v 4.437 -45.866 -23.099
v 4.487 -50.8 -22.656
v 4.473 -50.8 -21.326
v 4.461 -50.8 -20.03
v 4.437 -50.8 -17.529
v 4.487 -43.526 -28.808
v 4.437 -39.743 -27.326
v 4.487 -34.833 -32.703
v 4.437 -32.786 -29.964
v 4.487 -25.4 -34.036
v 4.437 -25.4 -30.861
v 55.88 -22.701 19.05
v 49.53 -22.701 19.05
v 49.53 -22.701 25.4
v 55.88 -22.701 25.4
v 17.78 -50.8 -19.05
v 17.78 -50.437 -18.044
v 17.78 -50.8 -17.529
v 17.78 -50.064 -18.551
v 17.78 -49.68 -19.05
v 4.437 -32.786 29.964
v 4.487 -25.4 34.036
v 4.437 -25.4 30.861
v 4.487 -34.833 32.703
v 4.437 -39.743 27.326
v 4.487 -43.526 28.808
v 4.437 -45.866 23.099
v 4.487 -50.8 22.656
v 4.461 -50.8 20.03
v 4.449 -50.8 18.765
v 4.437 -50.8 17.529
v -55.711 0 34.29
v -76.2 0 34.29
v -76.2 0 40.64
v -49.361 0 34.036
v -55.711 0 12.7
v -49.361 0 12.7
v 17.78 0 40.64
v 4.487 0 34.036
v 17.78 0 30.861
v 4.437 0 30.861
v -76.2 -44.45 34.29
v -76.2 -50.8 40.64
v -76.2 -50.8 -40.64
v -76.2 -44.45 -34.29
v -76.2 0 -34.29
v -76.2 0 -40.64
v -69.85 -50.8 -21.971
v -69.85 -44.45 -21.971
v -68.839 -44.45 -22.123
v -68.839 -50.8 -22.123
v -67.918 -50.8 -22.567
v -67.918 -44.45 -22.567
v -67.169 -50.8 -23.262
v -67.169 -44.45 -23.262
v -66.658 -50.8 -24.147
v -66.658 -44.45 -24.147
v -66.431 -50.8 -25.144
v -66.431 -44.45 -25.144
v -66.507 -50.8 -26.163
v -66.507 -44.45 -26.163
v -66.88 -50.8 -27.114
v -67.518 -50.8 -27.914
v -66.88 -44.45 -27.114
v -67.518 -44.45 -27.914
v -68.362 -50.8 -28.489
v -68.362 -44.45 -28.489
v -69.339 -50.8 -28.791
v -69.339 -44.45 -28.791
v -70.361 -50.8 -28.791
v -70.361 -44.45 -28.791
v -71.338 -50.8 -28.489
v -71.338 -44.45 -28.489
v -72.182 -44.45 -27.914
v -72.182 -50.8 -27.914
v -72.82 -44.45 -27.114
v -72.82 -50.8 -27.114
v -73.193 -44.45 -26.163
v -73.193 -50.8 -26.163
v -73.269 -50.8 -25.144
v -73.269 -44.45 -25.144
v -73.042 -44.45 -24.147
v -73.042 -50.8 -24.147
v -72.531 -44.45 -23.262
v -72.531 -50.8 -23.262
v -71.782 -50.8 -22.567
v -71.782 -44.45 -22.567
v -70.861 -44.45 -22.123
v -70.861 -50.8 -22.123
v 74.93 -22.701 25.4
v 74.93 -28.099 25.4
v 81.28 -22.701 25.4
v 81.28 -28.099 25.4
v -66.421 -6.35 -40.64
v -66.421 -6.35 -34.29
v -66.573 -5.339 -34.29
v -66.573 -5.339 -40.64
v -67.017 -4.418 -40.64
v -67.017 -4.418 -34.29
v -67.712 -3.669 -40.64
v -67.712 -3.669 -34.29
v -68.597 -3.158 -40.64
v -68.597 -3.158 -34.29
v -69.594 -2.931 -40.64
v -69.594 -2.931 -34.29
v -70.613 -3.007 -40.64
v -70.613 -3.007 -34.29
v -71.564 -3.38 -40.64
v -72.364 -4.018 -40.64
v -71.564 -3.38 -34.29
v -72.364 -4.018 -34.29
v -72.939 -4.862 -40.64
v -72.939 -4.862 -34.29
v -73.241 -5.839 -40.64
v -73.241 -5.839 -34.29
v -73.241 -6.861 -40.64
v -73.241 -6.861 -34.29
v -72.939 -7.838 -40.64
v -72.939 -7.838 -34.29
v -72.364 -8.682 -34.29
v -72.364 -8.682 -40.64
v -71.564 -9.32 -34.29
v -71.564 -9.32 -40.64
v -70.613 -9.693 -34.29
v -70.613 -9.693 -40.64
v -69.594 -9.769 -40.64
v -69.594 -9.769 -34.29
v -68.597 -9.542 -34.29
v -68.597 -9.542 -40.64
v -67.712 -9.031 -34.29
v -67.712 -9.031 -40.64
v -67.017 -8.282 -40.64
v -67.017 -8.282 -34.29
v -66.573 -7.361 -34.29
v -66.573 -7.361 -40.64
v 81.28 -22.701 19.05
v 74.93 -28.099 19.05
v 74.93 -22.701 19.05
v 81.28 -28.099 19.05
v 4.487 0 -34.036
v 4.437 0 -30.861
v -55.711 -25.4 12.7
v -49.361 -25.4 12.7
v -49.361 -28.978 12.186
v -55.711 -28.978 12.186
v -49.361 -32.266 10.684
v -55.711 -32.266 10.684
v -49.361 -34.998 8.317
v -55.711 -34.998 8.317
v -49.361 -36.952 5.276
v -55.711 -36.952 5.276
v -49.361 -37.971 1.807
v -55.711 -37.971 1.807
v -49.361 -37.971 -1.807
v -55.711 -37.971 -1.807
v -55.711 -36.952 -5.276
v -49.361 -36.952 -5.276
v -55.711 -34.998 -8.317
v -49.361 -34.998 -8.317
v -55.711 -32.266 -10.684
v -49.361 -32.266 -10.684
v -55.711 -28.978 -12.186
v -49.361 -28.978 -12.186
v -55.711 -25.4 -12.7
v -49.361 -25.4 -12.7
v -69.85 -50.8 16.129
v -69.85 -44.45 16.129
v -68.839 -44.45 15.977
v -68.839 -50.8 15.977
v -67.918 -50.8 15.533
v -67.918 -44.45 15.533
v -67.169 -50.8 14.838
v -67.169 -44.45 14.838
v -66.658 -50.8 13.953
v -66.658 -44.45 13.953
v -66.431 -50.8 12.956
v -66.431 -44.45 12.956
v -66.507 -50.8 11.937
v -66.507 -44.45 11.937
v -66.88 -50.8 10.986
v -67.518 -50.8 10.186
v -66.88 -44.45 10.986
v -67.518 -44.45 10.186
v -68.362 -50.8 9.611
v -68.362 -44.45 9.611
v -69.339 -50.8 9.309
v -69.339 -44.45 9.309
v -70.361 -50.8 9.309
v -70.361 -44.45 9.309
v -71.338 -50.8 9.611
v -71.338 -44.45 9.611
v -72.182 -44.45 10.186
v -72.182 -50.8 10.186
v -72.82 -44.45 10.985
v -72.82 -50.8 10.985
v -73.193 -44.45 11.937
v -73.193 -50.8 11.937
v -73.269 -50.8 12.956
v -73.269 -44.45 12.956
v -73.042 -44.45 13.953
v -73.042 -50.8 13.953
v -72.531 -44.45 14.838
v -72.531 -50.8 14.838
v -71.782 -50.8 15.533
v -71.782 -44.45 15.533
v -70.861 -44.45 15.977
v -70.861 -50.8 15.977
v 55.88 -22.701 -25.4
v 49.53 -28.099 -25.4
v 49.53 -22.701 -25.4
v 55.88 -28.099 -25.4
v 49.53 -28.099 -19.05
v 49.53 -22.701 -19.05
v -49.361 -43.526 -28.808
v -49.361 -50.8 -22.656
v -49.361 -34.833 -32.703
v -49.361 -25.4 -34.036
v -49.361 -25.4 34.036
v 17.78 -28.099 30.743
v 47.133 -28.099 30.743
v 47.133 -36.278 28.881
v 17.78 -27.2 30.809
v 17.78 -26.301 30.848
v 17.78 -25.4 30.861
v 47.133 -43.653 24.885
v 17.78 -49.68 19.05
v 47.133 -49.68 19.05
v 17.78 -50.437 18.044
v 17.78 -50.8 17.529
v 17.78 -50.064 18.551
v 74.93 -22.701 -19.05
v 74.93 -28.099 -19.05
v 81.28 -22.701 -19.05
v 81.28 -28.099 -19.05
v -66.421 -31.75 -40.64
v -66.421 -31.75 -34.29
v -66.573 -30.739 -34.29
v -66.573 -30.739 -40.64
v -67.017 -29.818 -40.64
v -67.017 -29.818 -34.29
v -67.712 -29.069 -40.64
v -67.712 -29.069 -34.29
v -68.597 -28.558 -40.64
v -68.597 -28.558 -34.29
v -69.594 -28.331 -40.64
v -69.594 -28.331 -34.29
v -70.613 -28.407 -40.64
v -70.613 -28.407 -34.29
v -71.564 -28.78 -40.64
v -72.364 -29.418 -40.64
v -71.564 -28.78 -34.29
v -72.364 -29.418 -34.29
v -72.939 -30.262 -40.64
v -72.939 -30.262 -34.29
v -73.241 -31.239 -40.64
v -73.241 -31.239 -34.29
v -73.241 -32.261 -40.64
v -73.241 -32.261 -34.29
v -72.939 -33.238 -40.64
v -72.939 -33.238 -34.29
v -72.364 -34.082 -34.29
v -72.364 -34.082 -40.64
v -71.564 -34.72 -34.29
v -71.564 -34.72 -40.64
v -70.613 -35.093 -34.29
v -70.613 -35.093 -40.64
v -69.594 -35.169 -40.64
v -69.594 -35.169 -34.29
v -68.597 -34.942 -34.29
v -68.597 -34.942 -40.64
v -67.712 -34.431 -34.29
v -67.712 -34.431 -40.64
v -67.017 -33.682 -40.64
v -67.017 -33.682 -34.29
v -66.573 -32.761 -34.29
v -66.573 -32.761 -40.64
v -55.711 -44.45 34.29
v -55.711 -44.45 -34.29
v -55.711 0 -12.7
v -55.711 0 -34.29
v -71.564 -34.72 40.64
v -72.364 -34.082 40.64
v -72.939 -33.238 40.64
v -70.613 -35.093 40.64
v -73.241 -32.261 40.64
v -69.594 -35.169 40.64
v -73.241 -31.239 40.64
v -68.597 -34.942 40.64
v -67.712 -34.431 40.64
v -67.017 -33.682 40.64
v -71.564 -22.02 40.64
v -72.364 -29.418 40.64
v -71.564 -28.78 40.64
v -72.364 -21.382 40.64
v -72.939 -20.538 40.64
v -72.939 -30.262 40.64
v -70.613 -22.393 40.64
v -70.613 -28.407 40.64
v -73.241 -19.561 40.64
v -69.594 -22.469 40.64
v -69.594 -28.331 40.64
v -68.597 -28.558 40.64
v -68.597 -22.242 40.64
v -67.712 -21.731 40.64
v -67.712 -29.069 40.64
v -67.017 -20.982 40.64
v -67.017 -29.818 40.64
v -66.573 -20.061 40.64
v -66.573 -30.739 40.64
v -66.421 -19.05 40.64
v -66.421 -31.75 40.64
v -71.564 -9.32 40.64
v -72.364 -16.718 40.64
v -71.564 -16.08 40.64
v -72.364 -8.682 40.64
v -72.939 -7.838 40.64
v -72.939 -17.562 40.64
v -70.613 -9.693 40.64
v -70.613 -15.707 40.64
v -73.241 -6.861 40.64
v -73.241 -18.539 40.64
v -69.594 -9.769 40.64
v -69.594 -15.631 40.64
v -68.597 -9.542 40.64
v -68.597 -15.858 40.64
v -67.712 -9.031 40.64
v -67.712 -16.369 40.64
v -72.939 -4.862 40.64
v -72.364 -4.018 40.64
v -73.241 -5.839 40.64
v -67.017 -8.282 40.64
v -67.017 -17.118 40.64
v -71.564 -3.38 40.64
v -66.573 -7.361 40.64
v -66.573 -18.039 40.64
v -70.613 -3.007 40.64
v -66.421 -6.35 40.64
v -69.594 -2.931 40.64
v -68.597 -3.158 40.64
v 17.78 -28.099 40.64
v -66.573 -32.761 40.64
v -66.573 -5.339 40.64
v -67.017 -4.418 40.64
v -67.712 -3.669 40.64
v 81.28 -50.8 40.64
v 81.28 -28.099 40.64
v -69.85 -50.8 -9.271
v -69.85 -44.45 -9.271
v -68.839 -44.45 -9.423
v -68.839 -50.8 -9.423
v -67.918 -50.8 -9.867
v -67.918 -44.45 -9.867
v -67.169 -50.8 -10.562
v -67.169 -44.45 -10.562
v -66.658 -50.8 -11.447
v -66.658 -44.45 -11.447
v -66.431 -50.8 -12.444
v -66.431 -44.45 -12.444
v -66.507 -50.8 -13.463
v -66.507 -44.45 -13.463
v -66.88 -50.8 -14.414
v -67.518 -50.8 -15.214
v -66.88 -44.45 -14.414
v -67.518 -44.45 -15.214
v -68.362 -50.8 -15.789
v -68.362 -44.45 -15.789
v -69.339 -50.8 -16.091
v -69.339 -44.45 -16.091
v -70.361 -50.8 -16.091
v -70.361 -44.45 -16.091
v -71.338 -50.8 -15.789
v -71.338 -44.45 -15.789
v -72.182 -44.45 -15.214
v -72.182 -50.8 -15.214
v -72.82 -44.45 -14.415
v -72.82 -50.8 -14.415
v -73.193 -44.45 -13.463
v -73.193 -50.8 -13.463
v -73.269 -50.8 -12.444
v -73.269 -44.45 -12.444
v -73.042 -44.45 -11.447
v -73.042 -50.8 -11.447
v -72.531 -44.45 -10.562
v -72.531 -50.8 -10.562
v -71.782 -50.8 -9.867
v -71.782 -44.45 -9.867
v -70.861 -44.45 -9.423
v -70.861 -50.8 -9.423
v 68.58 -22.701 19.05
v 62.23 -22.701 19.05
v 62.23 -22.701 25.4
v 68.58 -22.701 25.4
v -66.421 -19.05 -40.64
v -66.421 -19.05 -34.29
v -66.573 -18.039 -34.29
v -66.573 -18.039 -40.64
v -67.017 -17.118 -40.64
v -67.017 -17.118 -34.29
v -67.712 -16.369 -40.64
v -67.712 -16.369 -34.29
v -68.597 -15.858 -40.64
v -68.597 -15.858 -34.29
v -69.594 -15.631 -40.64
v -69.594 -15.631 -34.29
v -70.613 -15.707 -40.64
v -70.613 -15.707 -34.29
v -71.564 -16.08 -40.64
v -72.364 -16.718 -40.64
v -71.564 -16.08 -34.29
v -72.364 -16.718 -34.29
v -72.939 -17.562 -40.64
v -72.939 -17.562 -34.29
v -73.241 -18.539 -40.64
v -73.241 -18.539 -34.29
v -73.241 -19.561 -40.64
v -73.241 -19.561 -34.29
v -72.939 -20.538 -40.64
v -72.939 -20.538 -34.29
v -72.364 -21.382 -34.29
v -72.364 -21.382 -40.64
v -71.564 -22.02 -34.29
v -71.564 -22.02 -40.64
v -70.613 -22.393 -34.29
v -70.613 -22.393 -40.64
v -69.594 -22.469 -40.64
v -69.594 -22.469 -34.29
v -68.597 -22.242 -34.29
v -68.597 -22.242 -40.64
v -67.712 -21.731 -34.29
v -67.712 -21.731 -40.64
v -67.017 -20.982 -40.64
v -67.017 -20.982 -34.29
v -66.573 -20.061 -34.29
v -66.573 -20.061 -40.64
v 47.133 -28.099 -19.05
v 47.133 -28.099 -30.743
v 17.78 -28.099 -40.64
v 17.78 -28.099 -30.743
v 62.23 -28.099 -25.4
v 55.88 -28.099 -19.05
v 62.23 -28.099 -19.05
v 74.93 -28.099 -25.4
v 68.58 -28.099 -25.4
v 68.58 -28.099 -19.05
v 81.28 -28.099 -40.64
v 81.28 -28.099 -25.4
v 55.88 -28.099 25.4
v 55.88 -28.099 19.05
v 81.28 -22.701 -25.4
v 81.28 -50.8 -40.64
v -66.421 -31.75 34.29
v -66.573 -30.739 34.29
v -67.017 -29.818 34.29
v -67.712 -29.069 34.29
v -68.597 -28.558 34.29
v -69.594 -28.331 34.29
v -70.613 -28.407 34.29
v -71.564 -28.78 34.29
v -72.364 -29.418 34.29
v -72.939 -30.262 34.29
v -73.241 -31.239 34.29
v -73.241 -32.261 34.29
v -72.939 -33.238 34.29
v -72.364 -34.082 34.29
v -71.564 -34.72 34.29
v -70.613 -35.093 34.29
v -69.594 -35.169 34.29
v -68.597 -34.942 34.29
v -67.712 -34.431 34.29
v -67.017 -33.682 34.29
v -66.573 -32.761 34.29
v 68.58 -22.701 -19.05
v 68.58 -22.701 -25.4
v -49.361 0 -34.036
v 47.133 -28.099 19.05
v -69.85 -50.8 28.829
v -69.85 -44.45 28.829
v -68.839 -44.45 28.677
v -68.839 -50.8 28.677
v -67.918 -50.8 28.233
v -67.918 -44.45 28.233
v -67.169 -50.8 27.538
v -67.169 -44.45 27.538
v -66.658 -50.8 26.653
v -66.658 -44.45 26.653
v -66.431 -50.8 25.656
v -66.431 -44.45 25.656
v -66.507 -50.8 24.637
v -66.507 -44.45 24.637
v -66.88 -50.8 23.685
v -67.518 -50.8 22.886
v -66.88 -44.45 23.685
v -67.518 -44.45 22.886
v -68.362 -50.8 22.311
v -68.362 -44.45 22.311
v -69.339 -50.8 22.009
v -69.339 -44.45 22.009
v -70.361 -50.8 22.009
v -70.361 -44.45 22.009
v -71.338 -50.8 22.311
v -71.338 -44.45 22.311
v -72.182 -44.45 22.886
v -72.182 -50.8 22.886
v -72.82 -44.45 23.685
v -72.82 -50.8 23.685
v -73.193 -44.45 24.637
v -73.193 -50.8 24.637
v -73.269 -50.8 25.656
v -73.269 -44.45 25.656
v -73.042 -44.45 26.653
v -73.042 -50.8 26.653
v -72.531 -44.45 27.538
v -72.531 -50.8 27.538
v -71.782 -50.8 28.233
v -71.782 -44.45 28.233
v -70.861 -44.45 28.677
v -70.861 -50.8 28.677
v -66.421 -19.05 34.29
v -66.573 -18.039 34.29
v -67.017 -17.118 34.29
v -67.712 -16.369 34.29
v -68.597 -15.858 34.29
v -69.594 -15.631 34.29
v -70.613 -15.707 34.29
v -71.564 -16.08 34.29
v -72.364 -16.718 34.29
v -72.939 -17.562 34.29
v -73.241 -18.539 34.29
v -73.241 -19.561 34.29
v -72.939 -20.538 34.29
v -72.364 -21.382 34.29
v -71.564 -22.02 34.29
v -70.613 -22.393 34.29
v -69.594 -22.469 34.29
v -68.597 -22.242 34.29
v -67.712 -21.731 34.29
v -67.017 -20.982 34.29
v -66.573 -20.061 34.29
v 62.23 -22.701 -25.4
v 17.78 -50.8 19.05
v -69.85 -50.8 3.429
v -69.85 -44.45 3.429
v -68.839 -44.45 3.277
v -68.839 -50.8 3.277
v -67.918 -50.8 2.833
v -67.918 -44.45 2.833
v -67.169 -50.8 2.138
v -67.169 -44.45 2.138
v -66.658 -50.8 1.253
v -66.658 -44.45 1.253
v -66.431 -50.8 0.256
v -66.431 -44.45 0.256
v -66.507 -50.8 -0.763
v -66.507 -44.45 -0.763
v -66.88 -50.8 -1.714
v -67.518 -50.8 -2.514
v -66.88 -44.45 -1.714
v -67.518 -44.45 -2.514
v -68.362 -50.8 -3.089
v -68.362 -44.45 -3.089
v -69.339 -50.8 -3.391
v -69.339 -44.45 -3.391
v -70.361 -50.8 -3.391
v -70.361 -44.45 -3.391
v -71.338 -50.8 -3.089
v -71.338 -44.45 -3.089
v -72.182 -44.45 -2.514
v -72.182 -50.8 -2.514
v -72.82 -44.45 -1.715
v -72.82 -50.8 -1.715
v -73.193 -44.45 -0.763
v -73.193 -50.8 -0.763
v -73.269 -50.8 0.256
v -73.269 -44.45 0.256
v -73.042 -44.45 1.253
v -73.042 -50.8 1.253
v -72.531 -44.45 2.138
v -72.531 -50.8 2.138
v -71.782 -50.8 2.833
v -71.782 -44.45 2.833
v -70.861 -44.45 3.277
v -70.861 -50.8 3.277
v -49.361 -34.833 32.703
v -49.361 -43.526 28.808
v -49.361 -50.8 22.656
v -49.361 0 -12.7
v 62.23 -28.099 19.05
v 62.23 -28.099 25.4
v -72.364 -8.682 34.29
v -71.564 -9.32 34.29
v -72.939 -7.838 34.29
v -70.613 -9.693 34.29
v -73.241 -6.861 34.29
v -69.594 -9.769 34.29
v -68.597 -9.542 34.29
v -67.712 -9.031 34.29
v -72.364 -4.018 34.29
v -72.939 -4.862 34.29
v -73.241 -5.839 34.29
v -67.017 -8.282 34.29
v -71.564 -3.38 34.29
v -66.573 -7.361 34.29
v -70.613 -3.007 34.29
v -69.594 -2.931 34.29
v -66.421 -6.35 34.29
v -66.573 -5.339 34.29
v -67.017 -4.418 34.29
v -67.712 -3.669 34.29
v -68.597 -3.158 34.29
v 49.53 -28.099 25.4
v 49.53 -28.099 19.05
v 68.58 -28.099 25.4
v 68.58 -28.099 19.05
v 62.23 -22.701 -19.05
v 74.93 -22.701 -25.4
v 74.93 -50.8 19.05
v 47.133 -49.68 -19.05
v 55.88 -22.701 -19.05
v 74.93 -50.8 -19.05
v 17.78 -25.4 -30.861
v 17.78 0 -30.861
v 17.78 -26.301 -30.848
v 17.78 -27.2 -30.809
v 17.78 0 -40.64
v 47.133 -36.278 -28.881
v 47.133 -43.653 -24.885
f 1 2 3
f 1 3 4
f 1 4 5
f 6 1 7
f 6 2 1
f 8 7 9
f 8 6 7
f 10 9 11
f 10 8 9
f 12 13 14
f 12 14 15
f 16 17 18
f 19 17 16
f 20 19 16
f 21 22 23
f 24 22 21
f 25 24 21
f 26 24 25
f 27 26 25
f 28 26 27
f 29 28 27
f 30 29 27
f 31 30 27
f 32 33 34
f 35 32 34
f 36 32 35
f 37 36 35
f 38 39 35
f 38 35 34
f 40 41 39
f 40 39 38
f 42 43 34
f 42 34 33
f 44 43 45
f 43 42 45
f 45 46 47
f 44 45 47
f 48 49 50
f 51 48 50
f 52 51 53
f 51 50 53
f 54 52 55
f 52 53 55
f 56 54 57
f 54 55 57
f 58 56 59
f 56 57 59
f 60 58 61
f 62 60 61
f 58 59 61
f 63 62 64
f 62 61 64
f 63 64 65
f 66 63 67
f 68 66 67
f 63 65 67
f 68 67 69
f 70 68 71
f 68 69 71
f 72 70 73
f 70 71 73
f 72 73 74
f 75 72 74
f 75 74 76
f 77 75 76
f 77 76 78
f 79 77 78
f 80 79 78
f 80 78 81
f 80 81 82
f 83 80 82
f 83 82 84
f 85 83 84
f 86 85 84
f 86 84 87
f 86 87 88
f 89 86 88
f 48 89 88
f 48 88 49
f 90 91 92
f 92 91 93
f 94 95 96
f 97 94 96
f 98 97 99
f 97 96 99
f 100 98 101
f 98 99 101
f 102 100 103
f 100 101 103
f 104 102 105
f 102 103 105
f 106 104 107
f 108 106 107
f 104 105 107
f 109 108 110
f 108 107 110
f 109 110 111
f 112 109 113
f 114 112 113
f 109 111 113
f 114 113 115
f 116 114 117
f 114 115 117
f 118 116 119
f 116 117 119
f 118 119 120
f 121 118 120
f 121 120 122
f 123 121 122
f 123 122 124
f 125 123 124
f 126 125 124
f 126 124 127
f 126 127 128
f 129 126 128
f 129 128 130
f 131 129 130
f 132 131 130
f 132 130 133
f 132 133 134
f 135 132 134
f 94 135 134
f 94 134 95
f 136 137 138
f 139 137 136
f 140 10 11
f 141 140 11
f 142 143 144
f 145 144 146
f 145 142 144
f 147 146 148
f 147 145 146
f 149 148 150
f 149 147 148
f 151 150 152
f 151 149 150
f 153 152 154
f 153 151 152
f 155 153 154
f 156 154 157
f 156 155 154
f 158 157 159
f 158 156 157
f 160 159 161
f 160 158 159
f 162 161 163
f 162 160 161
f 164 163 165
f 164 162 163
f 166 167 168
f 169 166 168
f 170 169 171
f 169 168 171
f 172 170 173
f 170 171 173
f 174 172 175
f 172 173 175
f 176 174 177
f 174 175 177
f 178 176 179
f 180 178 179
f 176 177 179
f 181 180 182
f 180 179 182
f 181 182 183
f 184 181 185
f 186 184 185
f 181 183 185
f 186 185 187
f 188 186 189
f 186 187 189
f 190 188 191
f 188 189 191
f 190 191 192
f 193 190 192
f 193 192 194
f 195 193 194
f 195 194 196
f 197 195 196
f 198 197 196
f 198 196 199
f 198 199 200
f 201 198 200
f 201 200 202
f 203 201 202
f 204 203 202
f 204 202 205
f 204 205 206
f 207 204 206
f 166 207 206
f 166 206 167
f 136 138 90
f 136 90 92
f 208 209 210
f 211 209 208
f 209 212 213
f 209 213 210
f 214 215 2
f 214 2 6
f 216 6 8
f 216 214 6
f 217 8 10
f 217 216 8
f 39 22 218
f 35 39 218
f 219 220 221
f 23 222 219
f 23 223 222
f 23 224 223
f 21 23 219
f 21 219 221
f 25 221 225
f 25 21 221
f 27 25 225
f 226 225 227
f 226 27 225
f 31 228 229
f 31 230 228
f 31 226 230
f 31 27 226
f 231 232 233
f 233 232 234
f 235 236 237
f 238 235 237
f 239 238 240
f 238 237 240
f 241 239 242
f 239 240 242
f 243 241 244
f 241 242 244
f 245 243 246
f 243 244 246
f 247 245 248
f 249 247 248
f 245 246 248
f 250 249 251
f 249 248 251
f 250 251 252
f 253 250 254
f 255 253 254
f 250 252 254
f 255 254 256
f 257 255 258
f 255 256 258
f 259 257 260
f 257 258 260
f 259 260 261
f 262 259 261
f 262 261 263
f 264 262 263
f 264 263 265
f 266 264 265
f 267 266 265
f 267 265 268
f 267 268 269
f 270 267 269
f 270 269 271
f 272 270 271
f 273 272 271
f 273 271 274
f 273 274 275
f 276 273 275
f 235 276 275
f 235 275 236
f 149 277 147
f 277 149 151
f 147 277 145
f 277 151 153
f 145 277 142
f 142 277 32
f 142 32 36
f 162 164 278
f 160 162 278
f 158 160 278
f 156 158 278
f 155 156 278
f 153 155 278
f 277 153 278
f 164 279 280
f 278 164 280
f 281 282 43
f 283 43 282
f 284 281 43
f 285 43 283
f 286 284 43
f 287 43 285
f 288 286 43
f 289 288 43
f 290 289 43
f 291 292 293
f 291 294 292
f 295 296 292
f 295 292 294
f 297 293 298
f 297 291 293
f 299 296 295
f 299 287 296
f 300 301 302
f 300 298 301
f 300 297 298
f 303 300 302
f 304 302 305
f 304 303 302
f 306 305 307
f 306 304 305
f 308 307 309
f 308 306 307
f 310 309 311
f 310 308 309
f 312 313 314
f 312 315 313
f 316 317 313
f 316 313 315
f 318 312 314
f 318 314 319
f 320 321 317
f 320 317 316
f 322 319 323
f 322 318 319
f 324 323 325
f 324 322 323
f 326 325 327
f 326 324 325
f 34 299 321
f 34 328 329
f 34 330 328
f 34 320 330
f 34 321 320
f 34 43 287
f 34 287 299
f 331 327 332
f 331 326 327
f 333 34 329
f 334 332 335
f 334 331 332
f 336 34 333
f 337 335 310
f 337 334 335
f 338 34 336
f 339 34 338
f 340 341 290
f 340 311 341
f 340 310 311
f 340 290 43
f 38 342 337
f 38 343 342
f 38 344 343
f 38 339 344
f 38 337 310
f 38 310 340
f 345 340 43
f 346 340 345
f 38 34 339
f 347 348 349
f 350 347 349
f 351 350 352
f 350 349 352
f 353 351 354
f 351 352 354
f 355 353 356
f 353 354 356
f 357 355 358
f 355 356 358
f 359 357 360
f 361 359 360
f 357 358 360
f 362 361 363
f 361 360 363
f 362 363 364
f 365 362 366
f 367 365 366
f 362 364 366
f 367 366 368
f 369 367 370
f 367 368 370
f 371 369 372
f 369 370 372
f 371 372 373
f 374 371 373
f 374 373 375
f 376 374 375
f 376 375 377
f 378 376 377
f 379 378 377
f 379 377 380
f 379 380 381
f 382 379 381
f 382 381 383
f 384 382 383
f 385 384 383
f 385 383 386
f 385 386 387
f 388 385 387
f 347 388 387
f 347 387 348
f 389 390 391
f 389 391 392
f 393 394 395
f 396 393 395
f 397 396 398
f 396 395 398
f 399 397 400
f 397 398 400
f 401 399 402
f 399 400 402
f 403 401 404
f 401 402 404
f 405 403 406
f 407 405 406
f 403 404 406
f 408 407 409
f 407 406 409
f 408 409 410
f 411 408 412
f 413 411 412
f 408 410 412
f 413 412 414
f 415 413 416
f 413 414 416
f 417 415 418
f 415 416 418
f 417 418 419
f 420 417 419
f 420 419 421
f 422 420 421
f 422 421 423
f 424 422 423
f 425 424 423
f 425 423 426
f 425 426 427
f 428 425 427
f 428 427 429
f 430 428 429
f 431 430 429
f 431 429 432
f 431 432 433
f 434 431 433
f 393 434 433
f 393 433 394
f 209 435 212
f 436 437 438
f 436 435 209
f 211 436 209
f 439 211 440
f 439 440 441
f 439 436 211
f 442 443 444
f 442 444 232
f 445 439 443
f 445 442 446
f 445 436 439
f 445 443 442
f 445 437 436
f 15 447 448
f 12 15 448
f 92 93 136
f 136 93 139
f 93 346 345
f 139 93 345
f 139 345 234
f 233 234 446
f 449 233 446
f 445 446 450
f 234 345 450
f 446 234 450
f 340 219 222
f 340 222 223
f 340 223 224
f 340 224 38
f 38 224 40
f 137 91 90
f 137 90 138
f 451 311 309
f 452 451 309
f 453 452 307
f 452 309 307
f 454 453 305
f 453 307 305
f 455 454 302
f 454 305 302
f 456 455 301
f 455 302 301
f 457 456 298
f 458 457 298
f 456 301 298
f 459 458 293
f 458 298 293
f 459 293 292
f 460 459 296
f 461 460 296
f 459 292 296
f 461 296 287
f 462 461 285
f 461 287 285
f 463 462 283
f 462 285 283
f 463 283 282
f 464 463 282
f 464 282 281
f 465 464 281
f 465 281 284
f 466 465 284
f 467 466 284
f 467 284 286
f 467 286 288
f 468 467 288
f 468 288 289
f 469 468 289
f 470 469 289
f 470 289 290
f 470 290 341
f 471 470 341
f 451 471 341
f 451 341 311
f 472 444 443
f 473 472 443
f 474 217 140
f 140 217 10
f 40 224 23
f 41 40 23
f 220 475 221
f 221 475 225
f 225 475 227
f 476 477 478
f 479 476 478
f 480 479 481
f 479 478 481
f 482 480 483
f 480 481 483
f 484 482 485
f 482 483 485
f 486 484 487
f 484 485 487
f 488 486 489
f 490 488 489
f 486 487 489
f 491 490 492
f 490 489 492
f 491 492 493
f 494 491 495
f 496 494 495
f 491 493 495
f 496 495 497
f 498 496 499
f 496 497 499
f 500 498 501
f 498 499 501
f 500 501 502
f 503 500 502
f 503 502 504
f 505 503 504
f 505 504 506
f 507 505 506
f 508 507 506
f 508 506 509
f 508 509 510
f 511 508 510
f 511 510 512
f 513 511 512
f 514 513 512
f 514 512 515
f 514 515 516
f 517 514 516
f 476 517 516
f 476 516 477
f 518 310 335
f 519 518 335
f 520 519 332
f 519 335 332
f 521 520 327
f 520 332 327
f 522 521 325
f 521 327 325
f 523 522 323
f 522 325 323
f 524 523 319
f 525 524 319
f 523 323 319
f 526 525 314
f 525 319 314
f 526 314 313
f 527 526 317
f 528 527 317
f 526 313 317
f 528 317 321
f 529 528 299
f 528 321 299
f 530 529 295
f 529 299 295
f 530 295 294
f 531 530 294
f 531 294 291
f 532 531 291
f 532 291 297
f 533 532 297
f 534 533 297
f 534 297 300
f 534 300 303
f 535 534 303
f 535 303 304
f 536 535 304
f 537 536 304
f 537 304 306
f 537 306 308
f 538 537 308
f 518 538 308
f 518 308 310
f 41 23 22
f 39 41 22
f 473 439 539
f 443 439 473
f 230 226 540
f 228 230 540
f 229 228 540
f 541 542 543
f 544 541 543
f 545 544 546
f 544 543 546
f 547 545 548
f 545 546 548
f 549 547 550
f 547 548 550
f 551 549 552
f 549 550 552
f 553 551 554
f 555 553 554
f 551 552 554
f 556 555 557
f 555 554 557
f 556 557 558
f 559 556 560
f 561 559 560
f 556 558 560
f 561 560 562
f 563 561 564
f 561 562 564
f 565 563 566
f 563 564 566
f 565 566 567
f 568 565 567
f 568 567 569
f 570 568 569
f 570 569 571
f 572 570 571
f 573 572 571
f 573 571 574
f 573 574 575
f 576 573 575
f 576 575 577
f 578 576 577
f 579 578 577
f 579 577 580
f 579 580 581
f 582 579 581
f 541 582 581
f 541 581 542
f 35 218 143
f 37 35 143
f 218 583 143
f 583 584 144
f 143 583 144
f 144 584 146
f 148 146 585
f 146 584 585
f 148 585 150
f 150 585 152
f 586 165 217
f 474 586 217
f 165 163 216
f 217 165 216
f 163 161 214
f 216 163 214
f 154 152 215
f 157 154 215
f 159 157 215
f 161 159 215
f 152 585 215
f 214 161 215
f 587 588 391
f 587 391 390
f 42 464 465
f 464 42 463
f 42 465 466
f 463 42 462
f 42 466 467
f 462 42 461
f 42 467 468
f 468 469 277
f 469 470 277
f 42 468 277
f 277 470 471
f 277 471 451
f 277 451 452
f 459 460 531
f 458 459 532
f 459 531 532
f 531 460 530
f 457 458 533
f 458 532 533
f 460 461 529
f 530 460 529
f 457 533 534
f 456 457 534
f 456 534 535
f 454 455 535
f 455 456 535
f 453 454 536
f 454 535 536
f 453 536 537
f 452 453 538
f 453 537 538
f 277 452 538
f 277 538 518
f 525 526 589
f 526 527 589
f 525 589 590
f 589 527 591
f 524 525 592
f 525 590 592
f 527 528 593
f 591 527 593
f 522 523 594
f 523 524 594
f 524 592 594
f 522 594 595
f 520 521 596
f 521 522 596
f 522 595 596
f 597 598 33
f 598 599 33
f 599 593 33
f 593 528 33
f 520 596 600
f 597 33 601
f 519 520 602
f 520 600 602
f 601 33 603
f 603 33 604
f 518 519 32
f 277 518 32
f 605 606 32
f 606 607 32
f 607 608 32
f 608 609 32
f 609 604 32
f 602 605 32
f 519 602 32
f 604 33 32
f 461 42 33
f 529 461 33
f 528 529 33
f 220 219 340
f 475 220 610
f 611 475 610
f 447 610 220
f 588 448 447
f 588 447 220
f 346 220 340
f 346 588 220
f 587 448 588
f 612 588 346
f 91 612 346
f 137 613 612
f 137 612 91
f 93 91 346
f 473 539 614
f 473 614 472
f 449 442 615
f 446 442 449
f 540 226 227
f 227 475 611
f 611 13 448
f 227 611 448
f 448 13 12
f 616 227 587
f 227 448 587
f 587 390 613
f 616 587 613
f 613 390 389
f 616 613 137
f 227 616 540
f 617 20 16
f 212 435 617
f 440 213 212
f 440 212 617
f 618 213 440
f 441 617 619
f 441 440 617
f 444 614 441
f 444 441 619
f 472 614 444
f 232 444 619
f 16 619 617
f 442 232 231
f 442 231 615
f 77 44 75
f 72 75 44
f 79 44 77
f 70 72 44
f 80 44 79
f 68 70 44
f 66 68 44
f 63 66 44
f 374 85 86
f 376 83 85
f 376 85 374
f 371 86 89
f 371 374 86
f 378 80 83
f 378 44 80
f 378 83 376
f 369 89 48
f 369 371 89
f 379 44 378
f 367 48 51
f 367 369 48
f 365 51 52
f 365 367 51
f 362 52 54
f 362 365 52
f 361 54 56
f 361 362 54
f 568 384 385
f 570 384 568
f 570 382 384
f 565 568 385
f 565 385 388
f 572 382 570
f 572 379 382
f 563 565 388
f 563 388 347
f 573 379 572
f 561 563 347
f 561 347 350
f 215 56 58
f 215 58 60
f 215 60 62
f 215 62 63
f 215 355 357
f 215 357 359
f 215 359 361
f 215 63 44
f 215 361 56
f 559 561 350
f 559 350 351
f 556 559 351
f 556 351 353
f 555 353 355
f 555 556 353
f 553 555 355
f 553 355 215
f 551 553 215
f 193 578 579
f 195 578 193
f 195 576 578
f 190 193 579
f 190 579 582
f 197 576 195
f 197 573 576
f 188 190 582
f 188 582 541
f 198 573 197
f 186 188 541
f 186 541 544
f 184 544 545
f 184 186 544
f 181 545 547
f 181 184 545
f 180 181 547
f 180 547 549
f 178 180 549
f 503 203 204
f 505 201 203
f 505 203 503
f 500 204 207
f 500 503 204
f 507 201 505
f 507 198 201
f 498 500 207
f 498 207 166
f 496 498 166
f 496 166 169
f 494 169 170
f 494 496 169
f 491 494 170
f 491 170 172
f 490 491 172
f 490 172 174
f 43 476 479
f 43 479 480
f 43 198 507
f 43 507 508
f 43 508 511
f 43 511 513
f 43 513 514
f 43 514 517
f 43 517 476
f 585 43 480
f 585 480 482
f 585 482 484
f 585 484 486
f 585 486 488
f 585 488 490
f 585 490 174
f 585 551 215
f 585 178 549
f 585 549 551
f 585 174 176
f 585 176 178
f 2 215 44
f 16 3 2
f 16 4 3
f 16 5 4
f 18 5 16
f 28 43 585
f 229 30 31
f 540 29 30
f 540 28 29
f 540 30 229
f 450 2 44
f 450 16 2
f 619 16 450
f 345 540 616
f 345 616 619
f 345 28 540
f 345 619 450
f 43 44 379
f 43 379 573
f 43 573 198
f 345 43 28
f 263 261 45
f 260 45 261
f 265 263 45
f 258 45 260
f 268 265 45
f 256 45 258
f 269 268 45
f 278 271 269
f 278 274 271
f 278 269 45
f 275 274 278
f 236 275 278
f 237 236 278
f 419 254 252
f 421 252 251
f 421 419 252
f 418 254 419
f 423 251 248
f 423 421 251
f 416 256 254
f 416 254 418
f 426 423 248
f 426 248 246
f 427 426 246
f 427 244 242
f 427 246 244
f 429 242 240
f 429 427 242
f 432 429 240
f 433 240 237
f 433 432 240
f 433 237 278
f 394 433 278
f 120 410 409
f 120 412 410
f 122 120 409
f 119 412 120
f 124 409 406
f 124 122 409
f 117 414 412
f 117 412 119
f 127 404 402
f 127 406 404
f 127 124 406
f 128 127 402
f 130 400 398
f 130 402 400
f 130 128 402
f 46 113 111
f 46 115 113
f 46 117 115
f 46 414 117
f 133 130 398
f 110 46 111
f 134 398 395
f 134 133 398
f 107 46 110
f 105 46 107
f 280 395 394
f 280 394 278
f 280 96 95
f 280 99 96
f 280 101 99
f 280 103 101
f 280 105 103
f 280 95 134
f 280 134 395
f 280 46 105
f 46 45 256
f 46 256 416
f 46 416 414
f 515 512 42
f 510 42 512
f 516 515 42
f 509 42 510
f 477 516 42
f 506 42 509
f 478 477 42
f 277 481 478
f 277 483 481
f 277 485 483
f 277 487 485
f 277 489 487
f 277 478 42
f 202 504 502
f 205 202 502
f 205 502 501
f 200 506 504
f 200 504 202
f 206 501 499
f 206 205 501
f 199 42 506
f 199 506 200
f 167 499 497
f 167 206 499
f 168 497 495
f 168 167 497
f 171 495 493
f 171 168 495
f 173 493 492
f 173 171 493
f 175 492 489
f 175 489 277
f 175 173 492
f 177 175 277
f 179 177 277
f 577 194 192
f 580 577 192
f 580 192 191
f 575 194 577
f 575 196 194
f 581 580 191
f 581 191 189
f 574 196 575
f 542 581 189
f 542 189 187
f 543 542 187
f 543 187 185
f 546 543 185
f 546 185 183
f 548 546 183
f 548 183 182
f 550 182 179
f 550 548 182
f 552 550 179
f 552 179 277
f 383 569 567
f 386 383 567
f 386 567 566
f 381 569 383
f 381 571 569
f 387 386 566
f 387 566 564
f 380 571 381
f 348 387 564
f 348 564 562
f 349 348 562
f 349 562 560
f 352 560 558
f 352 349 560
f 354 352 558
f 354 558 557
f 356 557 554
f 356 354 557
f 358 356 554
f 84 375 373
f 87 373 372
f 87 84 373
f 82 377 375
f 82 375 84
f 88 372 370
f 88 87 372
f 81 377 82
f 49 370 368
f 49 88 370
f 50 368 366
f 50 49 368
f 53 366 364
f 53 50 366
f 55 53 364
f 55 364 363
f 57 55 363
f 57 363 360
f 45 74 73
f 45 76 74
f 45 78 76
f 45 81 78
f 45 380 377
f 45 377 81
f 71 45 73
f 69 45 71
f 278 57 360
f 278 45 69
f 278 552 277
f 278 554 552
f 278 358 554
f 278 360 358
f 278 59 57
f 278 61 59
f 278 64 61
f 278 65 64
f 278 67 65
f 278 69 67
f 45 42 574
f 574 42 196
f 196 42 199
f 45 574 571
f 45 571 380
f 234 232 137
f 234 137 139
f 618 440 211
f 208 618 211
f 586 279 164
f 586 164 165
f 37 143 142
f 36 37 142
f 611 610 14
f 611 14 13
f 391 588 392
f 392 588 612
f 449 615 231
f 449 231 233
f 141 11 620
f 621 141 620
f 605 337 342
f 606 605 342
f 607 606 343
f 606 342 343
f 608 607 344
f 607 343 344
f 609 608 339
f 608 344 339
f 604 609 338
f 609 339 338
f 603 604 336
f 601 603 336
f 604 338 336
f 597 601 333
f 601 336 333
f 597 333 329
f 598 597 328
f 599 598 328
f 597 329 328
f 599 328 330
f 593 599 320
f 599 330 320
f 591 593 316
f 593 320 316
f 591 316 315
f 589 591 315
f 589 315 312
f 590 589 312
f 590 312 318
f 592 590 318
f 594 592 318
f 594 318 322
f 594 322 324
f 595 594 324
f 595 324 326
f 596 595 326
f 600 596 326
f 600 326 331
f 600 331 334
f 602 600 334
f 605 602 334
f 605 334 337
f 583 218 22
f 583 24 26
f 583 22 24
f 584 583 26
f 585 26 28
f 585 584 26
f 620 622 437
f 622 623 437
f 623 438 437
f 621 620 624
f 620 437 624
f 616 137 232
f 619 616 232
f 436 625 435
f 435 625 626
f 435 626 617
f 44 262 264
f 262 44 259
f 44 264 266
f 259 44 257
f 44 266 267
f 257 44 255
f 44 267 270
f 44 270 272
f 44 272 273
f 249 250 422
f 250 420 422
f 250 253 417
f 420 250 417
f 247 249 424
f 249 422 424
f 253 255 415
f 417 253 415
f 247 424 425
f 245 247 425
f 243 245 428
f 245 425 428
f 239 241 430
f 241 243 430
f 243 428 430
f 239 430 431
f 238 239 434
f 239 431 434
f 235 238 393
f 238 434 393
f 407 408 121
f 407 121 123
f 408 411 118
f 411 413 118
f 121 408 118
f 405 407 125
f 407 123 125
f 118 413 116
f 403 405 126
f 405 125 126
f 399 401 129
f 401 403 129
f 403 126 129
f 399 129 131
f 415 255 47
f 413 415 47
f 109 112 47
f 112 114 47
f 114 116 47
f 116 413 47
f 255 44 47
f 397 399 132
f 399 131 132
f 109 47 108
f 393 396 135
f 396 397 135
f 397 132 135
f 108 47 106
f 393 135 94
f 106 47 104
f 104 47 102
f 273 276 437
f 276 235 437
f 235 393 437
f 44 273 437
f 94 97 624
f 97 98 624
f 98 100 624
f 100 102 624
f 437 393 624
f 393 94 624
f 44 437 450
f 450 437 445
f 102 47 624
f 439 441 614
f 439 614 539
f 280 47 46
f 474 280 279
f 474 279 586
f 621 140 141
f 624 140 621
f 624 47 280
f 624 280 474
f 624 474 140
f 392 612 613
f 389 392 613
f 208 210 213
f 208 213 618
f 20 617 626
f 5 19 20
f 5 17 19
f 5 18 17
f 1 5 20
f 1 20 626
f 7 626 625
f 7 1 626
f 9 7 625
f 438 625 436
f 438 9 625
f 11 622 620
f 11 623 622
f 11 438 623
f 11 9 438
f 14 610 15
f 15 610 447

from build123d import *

# Parameters (mm, degrees)
SKETCH1_W                = 157.48
SKETCH1_H                = 50.8
BOSS_EXTRUDE1_DEPTH      = 40.64
SKETCH37_W               = 81.28
SKETCH37_H               = 25.4
CUT_EXTRUDE32_DEPTH      = 171.388379885
BOSS_EXTRUDE5_DEPTH      = 25.4
CUT_EXTRUDE54_DEPTH      = 105.109019782
CUT_EXTRUDE54_DEPTH_BACK = 105.109019782
SKETCH45_W               = 63.5
SKETCH45_H               = 28.09875
SKETCH97_W               = 20.4891
SKETCH97_H               = 81.28
CUT_EXTRUDE72_DEPTH      = 44.45
SKETCH98_R               = 3.429
CUT_EXTRUDE73_DEPTH      = 102.162495521
SKETCH99_W               = 57.15
SKETCH99_H               = 38.1
CUT_EXTRUDE74_DEPTH      = 105.109019782
SKETCH101_W              = 6.35
SKETCH101_H              = 6.35
BOSS_EXTRUDE7_DEPTH      = 5.3975
BOSS_EXTRUDE8_REACH      = 106.109
SKETCH102_W              = 20.4891
SKETCH102_H              = 6.35
SKETCH103_R              = 3.429
CUT_EXTRUDE75_DEPTH      = 126.672259469


with BuildPart() as part:
    # Sketch1 → Boss-Extrude1 (new, symmetric)
    with BuildSketch(Plane.XY):
        with Locations((2.54, -25.4)):
            Rectangle(SKETCH1_W, SKETCH1_H)
    extrude(amount=BOSS_EXTRUDE1_DEPTH, both=True)

    # Sketch2 → Cut-Revolve1 (revolve, cut)
    with BuildSketch(Plane.XY, mode=Mode.PRIVATE) as cut_revolve1_sk:
        Polygon((-49.3609, 8.636), (-49.3609, -12.7), (-76.2, -12.7), (-76.2, -25.4), (19.629439755, -25.4), (72.533481331, -25.4), (72.533481331, -15.494), (47.133481331, -15.494), (47.133481331, 5.461390138), (4.437328256, 5.461390138), (4.4871, 8.636), align=None)
    revolve(cut_revolve1_sk.sketch.rotate(Axis((-607.361866059, -25.4, 0), (1, 0, 0)), 90), axis=Axis((-607.361866059, -25.4, 0), (1, 0, 0)), mode=Mode.SUBTRACT)

    # Sketch37 → Cut-Extrude32 (cut, through all)
    with BuildSketch(Plane(origin=(81.28, 0, 0), x_dir=(0, 0, -1), z_dir=(1, 0, 0))):
        with Locations((0, -12.7)):
            Rectangle(SKETCH37_W, SKETCH37_H)
    extrude(amount=-CUT_EXTRUDE32_DEPTH, mode=Mode.SUBTRACT)

    # Sketch39 → Boss-Extrude5 (add)
    with BuildSketch(Plane(origin=(0, -25.4, 0), x_dir=(1, 0, 0), z_dir=(0, 1, 0))):
        Polygon((-49.3609, -12.7), (-76.2, -12.7), (-76.2, -40.64), (81.28, -40.64), (81.28, 40.64), (-76.2, 40.64), (-76.2, 12.7), (-49.3609, 12.7), (-49.3609, 34.036), (4.4871, 34.036), (4.437328256, 30.861390138), (47.133481331, 30.861390138), (47.133481331, 9.906), (72.533481331, 9.906), (72.533481331, -9.906), (47.133481331, -9.906), (47.133481331, -30.861390138), (4.437328256, -30.861390138), (4.4871, -34.036), (-49.3609, -34.036), align=None)
    extrude(amount=BOSS_EXTRUDE5_DEPTH)

    # Sketch45 → Cut-Extrude54 (cut, two sides: drawn at the far end of the back side and taken through both)
    with BuildSketch(Plane.XY.offset(-CUT_EXTRUDE54_DEPTH_BACK)):
        with Locations((49.53, -14.049375)):
            Rectangle(SKETCH45_W, SKETCH45_H)
    extrude(amount=CUT_EXTRUDE54_DEPTH + CUT_EXTRUDE54_DEPTH_BACK, mode=Mode.SUBTRACT)

    # Sketch97 → Cut-Extrude72 (cut)
    with BuildSketch(Plane(origin=(0, 0, 0), x_dir=(1, 0, 0), z_dir=(0, 1, 0))):
        with Locations((-65.95545, 0)):
            Rectangle(SKETCH97_W, SKETCH97_H)
    extrude(amount=-CUT_EXTRUDE72_DEPTH, mode=Mode.SUBTRACT)

    # Sketch98 → Cut-Extrude73 (cut, through all)
    with BuildSketch(Plane(origin=(0, -44.45, 0), x_dir=(1, 0, 0), z_dir=(0, 1, 0))):
        with Locations(Location((-69.85, 25.4, 0), (0, 0, 270))):
            Circle(SKETCH98_R)
        with Locations(Location((-69.85, 12.7, 0), (0, 0, 270))):
            Circle(SKETCH98_R)
        with Locations(Location((-69.85, 0, 0), (0, 0, 270))):
            Circle(SKETCH98_R)
        with Locations(Location((-69.85, -12.7, 0), (0, 0, 270))):
            Circle(SKETCH98_R)
        with Locations(Location((-69.85, -25.4, 0), (0, 0, 270))):
            Circle(SKETCH98_R)
    extrude(amount=-CUT_EXTRUDE73_DEPTH, mode=Mode.SUBTRACT)

    # Sketch99 → Cut-Extrude74 (cut, through all)
    with BuildSketch(Plane(origin=(0, 0, 0), x_dir=(1, 0, 0), z_dir=(0, 1, 0))):
        with Locations((46.355, 0)):
            Rectangle(SKETCH99_W, SKETCH99_H)
    extrude(amount=-CUT_EXTRUDE74_DEPTH, mode=Mode.SUBTRACT)

    # Sketch101 → Boss-Extrude7 (add)
    with BuildSketch(Plane(origin=(0, -28.09875, 0), x_dir=(1, 0, 0), z_dir=(0, 1, 0))):
        with Locations((52.705, 22.225)):
            Rectangle(SKETCH101_W, SKETCH101_H)
        with Locations((65.405, 22.225)):
            Rectangle(SKETCH101_W, SKETCH101_H)
        with Locations((78.105, 22.225)):
            Rectangle(SKETCH101_W, SKETCH101_H)
        with Locations((78.105, -22.225)):
            Rectangle(SKETCH101_W, SKETCH101_H)
        with Locations((65.405, -22.225)):
            Rectangle(SKETCH101_W, SKETCH101_H)
        with Locations((52.705, -22.225)):
            Rectangle(SKETCH101_W, SKETCH101_H)
    extrude(amount=BOSS_EXTRUDE7_DEPTH)

    # Sketch102 → Boss-Extrude8 (add, up to next)
    with BuildSketch(Plane(origin=(0, 0, 0), x_dir=(1, 0, 0), z_dir=(0, 1, 0)), mode=Mode.PRIVATE) as boss_extrude8_sk1:
        with Locations((-65.95545, 37.465)):
            Rectangle(SKETCH102_W, SKETCH102_H)
    boss_extrude8_tool1 = extrude(boss_extrude8_sk1.sketch, amount=-BOSS_EXTRUDE8_REACH, mode=Mode.PRIVATE) - part.part
    # Sketch102 → Boss-Extrude8 (add, up to next)
    with BuildSketch(Plane(origin=(0, 0, 0), x_dir=(1, 0, 0), z_dir=(0, 1, 0)), mode=Mode.PRIVATE) as boss_extrude8_sk2:
        with Locations((-65.95545, -37.465)):
            Rectangle(SKETCH102_W, SKETCH102_H)
    boss_extrude8_tool2 = extrude(boss_extrude8_sk2.sketch, amount=-BOSS_EXTRUDE8_REACH, mode=Mode.PRIVATE) - part.part
    add(boss_extrude8_tool1.solids().sort_by_distance((-65.95545, 0, -37.465))[0])
    add(boss_extrude8_tool2.solids().sort_by_distance((-65.95545, 0, 37.465))[0])

    # Sketch103 → Cut-Extrude75 (cut, through all)
    with BuildSketch(Plane.XY.offset(40.64)):
        with Locations((-69.85, -6.35)):
            Circle(SKETCH103_R)
        with Locations((-69.85, -19.05)):
            Circle(SKETCH103_R)
        with Locations((-69.85, -31.75)):
            Circle(SKETCH103_R)
    extrude(amount=-CUT_EXTRUDE75_DEPTH, mode=Mode.SUBTRACT)


solid = part.part
